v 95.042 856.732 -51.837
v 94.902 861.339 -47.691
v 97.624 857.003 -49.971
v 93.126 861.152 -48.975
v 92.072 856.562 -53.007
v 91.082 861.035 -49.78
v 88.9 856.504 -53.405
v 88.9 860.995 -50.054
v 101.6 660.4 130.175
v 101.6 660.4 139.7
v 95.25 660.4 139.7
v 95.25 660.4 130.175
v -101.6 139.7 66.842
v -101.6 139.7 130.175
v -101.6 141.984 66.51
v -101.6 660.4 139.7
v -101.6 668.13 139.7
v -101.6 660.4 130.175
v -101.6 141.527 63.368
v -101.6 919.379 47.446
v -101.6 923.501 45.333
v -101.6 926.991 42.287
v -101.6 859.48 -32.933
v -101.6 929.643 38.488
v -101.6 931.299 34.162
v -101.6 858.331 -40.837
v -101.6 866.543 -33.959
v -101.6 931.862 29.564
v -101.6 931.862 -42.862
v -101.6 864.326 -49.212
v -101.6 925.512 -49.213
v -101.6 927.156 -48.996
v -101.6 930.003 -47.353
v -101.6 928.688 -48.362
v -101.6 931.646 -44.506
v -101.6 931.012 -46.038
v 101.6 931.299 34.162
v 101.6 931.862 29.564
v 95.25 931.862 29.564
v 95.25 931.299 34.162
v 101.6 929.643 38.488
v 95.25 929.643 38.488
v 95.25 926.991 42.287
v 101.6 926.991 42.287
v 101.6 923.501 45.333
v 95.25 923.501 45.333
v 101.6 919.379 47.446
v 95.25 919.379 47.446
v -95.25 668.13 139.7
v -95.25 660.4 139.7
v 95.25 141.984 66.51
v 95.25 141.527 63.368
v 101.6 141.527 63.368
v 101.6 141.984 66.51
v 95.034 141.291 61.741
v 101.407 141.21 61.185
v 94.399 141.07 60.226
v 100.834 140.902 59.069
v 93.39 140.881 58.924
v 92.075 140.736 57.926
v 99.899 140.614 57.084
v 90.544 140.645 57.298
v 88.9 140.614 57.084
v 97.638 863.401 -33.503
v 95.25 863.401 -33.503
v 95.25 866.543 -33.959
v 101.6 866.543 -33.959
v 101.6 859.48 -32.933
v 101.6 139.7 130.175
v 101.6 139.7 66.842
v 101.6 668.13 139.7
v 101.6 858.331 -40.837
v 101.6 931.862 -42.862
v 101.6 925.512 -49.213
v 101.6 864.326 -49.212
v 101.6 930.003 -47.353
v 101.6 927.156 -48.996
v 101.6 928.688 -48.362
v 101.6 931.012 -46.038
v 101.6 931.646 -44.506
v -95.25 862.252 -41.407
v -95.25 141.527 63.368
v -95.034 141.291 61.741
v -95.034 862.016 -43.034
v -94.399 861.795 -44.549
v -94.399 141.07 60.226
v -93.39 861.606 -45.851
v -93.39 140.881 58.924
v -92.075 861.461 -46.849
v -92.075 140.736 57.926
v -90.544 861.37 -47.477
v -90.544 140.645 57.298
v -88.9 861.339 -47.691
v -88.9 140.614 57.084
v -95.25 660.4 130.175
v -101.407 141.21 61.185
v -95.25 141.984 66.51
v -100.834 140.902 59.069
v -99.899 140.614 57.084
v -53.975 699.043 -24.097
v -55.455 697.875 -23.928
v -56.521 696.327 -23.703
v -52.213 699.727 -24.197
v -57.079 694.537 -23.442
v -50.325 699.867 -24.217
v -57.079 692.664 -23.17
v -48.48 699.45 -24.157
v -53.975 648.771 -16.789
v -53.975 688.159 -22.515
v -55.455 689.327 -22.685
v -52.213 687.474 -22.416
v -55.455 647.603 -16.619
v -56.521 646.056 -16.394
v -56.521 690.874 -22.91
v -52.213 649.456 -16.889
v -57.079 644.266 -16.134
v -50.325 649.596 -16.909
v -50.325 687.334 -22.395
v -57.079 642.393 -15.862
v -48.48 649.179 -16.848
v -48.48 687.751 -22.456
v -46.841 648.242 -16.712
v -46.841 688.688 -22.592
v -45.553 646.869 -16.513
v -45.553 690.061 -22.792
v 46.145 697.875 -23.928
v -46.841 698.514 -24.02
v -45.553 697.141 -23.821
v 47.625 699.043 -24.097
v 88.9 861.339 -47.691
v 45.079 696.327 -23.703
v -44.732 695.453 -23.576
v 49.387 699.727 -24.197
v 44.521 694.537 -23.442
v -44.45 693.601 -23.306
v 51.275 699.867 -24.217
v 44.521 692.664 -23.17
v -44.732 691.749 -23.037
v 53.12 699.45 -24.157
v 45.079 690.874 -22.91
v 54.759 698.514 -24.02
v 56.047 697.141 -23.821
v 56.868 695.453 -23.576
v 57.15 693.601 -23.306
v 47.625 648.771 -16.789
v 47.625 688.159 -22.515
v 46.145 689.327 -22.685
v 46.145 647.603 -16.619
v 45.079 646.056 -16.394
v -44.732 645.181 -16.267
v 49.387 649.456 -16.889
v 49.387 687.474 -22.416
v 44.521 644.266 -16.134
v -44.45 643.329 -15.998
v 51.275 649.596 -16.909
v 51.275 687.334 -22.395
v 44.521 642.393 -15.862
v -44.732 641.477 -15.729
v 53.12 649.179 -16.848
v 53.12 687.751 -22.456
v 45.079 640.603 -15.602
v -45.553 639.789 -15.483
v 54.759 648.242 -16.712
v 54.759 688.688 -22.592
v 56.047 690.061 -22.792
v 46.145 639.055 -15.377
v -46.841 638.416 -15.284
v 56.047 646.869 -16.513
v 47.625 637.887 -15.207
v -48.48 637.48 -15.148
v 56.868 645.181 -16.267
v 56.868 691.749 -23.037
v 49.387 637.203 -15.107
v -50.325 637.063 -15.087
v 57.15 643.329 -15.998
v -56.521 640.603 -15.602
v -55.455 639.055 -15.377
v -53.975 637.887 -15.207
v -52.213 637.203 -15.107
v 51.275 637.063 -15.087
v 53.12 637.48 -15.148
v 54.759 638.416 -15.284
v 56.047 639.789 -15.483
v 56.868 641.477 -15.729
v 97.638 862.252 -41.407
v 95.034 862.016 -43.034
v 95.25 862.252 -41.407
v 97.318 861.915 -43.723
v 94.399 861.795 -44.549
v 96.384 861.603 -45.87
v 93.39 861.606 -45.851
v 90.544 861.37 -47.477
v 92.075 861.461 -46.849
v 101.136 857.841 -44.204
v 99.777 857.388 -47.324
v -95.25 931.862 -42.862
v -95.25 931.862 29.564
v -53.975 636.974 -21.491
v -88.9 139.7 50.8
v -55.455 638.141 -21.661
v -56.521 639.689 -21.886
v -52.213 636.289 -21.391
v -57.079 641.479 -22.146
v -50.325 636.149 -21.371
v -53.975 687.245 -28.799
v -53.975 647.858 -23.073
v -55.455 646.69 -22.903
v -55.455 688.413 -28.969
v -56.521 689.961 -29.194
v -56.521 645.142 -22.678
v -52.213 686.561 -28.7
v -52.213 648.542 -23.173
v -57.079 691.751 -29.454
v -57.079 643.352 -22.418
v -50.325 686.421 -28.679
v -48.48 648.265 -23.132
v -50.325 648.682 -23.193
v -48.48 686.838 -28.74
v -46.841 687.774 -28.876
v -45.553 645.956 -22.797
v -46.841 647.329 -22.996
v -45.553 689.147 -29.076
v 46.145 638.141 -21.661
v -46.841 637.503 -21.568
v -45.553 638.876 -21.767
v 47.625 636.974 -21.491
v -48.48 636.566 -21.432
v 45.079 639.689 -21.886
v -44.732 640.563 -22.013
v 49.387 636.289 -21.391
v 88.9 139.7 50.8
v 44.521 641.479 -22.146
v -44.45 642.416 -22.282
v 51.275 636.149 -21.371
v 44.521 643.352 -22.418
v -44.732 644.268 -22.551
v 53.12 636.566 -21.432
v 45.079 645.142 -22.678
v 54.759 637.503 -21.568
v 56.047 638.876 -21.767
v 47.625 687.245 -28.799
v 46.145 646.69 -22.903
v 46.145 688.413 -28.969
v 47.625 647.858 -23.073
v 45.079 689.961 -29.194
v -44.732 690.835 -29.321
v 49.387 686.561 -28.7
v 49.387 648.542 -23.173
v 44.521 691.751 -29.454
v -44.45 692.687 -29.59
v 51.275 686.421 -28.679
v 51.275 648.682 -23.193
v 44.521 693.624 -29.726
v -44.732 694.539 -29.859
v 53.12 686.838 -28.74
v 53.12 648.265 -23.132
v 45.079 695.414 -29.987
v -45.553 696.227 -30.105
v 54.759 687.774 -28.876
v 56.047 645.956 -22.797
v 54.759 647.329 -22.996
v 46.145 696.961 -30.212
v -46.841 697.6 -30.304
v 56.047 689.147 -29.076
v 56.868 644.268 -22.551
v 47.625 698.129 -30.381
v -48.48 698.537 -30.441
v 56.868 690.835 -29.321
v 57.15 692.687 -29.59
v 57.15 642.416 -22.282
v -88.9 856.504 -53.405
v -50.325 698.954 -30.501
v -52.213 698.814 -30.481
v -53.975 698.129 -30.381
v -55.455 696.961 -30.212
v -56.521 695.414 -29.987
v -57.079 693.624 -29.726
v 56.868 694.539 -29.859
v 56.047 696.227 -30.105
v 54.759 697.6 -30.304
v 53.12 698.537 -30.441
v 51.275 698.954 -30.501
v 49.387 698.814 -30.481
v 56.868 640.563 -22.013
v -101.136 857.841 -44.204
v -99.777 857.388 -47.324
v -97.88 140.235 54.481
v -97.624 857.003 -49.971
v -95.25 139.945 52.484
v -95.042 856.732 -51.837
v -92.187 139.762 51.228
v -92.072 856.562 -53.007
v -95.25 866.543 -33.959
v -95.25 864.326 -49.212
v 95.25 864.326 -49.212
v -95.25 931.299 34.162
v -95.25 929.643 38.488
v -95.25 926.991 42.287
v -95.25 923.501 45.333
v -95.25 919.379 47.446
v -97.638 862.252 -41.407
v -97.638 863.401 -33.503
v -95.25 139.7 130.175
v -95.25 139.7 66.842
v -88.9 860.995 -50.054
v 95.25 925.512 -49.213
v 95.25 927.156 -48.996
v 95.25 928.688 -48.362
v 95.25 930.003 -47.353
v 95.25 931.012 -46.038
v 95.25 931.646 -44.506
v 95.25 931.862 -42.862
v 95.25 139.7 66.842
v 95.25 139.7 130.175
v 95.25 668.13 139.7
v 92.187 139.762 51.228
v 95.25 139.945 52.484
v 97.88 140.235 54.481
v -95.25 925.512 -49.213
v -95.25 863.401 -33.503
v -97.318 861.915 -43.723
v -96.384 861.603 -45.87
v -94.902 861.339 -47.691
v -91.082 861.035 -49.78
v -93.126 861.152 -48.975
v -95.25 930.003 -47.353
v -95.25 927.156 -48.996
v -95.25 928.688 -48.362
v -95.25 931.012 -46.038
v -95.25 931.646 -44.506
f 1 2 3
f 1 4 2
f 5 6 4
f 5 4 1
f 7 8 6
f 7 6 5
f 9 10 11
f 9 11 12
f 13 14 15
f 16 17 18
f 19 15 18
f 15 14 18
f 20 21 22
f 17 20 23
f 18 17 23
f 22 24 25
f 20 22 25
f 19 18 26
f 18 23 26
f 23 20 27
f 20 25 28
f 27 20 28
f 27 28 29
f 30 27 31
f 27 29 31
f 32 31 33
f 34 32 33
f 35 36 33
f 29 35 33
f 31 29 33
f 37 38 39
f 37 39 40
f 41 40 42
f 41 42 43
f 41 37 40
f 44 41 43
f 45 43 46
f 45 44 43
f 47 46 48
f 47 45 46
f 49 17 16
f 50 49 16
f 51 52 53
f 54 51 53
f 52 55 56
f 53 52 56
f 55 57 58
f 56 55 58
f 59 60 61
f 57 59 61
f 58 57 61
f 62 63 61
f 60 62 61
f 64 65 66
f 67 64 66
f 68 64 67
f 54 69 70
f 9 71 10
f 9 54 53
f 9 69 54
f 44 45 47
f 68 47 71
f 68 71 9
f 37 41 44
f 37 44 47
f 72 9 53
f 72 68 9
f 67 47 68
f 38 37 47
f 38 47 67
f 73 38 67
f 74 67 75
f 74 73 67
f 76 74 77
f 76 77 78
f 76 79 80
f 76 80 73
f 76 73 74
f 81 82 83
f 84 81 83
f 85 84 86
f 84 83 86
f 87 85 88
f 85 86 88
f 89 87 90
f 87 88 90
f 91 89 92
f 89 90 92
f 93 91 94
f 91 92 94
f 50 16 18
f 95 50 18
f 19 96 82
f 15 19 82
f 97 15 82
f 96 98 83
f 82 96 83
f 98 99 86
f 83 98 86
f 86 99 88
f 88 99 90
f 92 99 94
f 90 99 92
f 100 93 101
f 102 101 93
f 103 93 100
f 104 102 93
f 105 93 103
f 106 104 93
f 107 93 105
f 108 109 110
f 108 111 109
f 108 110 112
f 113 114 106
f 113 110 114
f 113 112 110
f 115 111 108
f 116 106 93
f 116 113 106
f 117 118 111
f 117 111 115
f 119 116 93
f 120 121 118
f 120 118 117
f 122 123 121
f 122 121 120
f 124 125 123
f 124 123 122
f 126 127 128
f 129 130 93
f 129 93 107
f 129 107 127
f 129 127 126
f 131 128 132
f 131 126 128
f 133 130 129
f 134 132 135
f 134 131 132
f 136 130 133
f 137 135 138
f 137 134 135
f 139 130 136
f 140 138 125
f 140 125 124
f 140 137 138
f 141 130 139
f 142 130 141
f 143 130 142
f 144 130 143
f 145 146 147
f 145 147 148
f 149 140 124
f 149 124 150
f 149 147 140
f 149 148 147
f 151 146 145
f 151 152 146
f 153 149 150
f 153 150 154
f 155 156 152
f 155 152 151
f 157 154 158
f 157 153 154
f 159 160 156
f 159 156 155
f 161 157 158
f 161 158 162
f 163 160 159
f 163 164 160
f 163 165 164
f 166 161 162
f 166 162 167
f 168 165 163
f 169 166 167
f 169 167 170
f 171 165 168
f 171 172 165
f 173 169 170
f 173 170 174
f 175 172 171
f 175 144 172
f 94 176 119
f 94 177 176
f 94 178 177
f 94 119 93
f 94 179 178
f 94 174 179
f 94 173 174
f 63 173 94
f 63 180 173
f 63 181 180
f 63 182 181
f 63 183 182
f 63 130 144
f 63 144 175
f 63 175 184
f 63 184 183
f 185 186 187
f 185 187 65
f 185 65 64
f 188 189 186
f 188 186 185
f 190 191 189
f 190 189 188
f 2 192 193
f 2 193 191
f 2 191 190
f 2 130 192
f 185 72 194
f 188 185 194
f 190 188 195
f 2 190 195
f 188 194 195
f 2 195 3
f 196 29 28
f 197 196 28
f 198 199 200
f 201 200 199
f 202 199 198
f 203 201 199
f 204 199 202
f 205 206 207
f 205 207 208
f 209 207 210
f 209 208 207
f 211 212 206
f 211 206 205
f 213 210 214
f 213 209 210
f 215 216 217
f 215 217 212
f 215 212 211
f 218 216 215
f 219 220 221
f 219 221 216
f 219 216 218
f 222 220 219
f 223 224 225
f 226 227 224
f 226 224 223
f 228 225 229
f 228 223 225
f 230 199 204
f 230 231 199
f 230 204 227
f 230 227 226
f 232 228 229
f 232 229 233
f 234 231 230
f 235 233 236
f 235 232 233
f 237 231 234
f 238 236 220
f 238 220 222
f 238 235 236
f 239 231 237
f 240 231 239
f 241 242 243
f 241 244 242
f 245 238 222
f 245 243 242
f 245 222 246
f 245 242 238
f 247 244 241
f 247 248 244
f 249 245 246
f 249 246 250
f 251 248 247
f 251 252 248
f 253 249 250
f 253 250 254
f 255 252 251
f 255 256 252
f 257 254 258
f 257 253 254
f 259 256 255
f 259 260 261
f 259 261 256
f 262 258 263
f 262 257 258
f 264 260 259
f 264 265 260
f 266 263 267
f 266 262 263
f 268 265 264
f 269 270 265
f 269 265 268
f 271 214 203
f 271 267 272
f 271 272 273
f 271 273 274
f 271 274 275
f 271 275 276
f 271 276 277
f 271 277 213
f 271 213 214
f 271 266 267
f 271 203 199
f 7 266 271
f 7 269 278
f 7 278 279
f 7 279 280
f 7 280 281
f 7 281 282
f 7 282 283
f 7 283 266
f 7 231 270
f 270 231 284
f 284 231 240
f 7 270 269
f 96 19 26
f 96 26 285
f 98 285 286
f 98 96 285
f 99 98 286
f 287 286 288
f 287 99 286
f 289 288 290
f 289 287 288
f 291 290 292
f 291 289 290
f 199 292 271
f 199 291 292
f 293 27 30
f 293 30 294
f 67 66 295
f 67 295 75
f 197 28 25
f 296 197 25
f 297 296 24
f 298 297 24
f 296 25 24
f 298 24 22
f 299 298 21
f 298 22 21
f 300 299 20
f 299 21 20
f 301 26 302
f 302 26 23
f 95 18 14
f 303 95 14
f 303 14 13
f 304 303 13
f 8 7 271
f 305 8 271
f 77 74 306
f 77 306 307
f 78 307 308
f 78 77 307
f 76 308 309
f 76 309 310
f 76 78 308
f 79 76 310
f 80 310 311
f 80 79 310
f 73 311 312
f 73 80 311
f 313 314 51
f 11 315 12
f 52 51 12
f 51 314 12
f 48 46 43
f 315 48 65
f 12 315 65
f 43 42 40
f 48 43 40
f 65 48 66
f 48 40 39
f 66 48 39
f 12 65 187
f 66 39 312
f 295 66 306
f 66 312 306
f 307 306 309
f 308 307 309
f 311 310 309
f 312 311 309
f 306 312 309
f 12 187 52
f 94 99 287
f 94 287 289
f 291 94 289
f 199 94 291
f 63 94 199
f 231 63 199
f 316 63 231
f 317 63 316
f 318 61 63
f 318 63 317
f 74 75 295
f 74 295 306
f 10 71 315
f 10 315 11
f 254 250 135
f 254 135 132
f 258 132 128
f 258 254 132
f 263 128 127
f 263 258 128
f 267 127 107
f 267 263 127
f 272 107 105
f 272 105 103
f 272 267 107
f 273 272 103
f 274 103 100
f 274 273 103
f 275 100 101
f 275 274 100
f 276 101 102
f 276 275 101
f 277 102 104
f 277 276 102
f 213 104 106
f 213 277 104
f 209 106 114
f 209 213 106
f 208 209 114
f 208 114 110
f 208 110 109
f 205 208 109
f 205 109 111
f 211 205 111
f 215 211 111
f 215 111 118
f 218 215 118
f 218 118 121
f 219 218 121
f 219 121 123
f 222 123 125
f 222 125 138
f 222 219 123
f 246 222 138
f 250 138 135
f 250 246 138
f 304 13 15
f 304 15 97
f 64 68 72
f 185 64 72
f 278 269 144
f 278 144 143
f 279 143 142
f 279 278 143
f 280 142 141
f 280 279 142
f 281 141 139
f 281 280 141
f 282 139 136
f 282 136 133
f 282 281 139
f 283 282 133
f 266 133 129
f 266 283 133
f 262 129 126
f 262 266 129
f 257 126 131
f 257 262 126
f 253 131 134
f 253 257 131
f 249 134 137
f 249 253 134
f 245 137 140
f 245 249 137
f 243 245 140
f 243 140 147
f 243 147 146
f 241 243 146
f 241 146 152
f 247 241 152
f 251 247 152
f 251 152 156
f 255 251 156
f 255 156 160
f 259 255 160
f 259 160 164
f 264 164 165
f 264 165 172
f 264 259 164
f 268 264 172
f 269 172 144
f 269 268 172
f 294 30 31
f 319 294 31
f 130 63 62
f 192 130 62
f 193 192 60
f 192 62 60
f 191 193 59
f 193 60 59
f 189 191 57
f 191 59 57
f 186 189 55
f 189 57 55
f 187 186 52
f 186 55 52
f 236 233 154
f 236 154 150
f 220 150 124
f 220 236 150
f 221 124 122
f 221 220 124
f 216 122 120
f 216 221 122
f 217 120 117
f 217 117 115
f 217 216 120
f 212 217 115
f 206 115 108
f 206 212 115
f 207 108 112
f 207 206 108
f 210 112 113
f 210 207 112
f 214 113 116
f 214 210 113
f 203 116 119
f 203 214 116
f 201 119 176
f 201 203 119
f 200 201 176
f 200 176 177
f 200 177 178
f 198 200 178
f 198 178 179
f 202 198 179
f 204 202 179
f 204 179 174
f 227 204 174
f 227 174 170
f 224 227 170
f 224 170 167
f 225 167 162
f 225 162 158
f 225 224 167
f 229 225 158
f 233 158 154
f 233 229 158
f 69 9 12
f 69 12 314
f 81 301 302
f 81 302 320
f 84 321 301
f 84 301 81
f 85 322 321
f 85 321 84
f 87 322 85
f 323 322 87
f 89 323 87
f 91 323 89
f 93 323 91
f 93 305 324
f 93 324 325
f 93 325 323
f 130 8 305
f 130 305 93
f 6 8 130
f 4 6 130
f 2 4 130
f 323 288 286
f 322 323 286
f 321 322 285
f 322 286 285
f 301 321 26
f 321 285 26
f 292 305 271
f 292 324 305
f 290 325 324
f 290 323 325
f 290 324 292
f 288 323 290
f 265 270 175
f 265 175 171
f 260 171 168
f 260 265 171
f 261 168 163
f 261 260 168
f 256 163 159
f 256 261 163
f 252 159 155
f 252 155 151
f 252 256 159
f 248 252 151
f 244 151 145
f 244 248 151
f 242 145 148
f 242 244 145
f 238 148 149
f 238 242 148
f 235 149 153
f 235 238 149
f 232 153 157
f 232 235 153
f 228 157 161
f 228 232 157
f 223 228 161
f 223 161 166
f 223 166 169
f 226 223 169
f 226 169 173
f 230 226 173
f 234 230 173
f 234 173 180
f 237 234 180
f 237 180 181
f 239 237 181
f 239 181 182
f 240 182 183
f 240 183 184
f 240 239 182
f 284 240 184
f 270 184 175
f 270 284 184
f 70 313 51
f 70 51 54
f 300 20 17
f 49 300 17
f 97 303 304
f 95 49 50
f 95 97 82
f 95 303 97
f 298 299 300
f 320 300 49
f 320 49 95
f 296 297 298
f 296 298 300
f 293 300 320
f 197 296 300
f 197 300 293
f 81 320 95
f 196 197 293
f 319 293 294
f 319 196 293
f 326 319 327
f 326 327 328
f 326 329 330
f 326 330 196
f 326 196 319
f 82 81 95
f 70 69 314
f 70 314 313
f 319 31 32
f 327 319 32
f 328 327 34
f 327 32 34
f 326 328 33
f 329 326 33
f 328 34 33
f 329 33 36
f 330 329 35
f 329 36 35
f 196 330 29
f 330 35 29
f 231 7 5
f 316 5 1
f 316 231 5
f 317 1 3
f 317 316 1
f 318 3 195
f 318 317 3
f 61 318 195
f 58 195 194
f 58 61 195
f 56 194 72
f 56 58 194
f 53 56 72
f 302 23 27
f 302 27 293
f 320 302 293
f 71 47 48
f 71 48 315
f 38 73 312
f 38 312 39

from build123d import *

# Parameters (mm, degrees)
BOSS_EXTRUDE1_DEPTH    = 101.6
BOSS_EXTRUDE2_DEPTH    = 6.35
CUT_EXTRUDE1_START     = 70.369117279
CUT_EXTRUDE1_OUTLINE_R = 6.35
CUT_EXTRUDE1_DEPTH     = 6.35
FLATTEN_BENDS1_START   = 128.994638868
FLATTEN_BENDS1_DEPTH   = 733.419948548
FLATTEN_BENDS1_START_2 = 859.239587416
FLATTEN_BENDS1_2_DEPTH = 3.175
FLATTEN_BENDS1_START_3 = 128.630782005
FLATTEN_BENDS1_3_DEPTH = 2.307819383
FLATTEN_BENDS1_START_4 = 130.938601388
FLATTEN_BENDS1_4_DEPTH = 728.300986028
CHAMFER1_SIZE          = 3.9624


# Read off the part's stored shape, not the designer's step: Cut-Extrude1, Flatten-Bends1
with BuildPart() as part:
    # Sketch11 → Boss-Extrude1 (new, symmetric)
    with BuildSketch(Plane(origin=(0, 0, 0), x_dir=(0, 0, -1), z_dir=(1, 0, 0))):
        Polygon((-57.083945563, 140.613525126), (-50.8, 139.7), (53.975, 860.425), (47.691054437, 861.338525126), align=None)
    extrude(amount=BOSS_EXTRUDE1_DEPTH, both=True)

    # Sketch8 → Boss-Extrude2 (add)
    with BuildSketch(Plane(origin=(101.6, 0, 0), x_dir=(0, 0, -1), z_dir=(1, 0, 0))):
        with BuildLine():
            Line((-130.175, 139.7), (-57.216748776, 139.7))
            Line((-57.216748776, 139.7), (-57.083945563, 140.613525126))
            Line((-57.083945563, 140.613525126), (-50.8, 139.7))
            Line((-50.8, 139.7), (53.975, 860.425))
            Line((53.975, 860.425), (49.2125, 861.117345815))
            Line((49.2125, 861.117345815), (49.2125, 925.5125))
            ThreePointArc((49.2125, 925.5125), (47.352628061, 930.002628061), (42.8625, 931.8625))
            Line((42.8625, 931.8625), (-29.563705158, 931.8625))
            ThreePointArc((-29.563705158, 931.8625), (-40.468229819, 928.432802235), (-47.446326779, 919.378651382))
            Line((-47.446326779, 919.378651382), (-139.7, 668.12987028))
            Line((-139.7, 668.12987028), (-139.7, 660.4))
            Line((-139.7, 660.4), (-130.175, 660.4))
            Line((-130.175, 660.4), (-130.175, 139.7))
        make_face()
    boss_extrude2 = extrude(amount=-BOSS_EXTRUDE2_DEPTH)

    # Mirror1: Boss-Extrude2 across plane
    add(boss_extrude2.mirror(Plane(origin=(0, 0, 0), x_dir=(0, 0, 1), z_dir=(1, 0, 0))))

    # Cut-Extrude1 outline → Cut-Extrude1 (cut)
    with BuildSketch(Plane(origin=(0, 0, 0), x_dir=(1, 0, 0), z_dir=(0, 0.143862224560971, 0.989597726525465)).offset(CUT_EXTRUDE1_START)):
        with Locations((50.8, 638.938601388)):
            Circle(CUT_EXTRUDE1_OUTLINE_R)
        with Locations((50.8, 689.738601388)):
            Circle(CUT_EXTRUDE1_OUTLINE_R)
        with Locations((-50.8, 638.938601388)):
            Circle(CUT_EXTRUDE1_OUTLINE_R)
        with Locations((-50.8, 689.738601388)):
            Circle(CUT_EXTRUDE1_OUTLINE_R)
    extrude(amount=CUT_EXTRUDE1_DEPTH, mode=Mode.SUBTRACT)

    # Flatten-Bends1 outline → Flatten-Bends1 (cut)
    with BuildSketch(Plane(origin=(0, 0, 0), x_dir=(1, 0, 0), z_dir=(0, 0.989597726525465, -0.143862224560971)).offset(FLATTEN_BENDS1_START)):
        with BuildLine():
            ThreePointArc((-101.6, -83.069117279), (-97.880256121, -74.088861158), (-88.9, -70.369117279))
            Line((-88.9, -70.369117279), (-101.6, -70.369117279))
            Line((-101.6, -70.369117279), (-101.6, -83.069117279))
        make_face()
        with BuildLine():
            Line((101.6, -70.369117279), (88.9, -70.369117279))
            ThreePointArc((88.9, -70.369117279), (97.880256121, -74.088861158), (101.6, -83.069117279))
            Line((101.6, -83.069117279), (101.6, -70.369117279))
        make_face()
    extrude(amount=FLATTEN_BENDS1_DEPTH, mode=Mode.SUBTRACT)

    # Flatten-Bends1 2 outline → Flatten-Bends1 2 (cut)
    with BuildSketch(Plane(origin=(0, 0, 0), x_dir=(1, 0, 0), z_dir=(0, 0.989597726525465, -0.143862224560971)).offset(FLATTEN_BENDS1_START_2)):
        with BuildLine():
            Line((-101.6, -83.069117279), (-101.6, -91.05667886))
            Line((-101.6, -91.05667886), (-95.25, -91.05667886))
            Line((-95.25, -91.05667886), (-95.25, -76.719117279))
            Line((-95.25, -76.719117279), (95.25, -76.719117279))
            Line((95.25, -76.719117279), (95.25, -91.05667886))
            Line((95.25, -91.05667886), (101.6, -91.05667886))
            Line((101.6, -91.05667886), (101.6, -83.069117279))
            ThreePointArc((101.6, -83.069117279), (97.880256121, -74.088861158), (88.9, -70.369117279))
            Line((88.9, -70.369117279), (-88.9, -70.369117279))
            ThreePointArc((-88.9, -70.369117279), (-97.880256121, -74.088861158), (-101.6, -83.069117279))
        make_face()
    extrude(amount=FLATTEN_BENDS1_2_DEPTH, mode=Mode.SUBTRACT)

    # Flatten-Bends1 3 outline → Flatten-Bends1 3 (cut)
    with BuildSketch(Plane(origin=(0, 0, 0), x_dir=(1, 0, 0), z_dir=(0, 0.989597726525465, -0.143862224560971)).offset(FLATTEN_BENDS1_START_3)):
        with BuildLine():
            Line((-101.6, -83.069117279), (-101.6, -86.244117279))
            Line((-101.6, -86.244117279), (-95.25, -86.244117279))
            Line((-95.25, -86.244117279), (-95.25, -76.719117279))
            Line((-95.25, -76.719117279), (-99.898522628, -76.719117279))
            ThreePointArc((-99.898522628, -76.719117279), (-101.167257994, -79.782115406), (-101.6, -83.069117279))
        make_face()
        with BuildLine():
            Line((95.25, -76.719117279), (95.25, -86.244117279))
            Line((95.25, -86.244117279), (101.6, -86.244117279))
            Line((101.6, -86.244117279), (101.6, -83.069117279))
            ThreePointArc((101.6, -83.069117279), (101.167257994, -79.782115406), (99.898522628, -76.719117279))
            Line((99.898522628, -76.719117279), (95.25, -76.719117279))
        make_face()
    extrude(amount=FLATTEN_BENDS1_3_DEPTH, mode=Mode.SUBTRACT)

    # Flatten-Bends1 4 outline → Flatten-Bends1 4 (add)
    with BuildSketch(Plane(origin=(0, 0, 0), x_dir=(1, 0, 0), z_dir=(0, 0.989597726525465, -0.143862224560971)).offset(FLATTEN_BENDS1_START_4)):
        with BuildLine():
            Line((-95.25, -76.719117279), (-95.25, -83.069117279))
            ThreePointArc((-95.25, -83.069117279), (-93.390128061, -78.578989218), (-88.9, -76.719117279))
            Line((-88.9, -76.719117279), (-95.25, -76.719117279))
        make_face()
        with BuildLine():
            Line((95.25, -76.719117279), (88.9, -76.719117279))
            ThreePointArc((88.9, -76.719117279), (93.390128061, -78.578989218), (95.25, -83.069117279))
            Line((95.25, -83.069117279), (95.25, -76.719117279))
        make_face()
    extrude(amount=FLATTEN_BENDS1_4_DEPTH)

    # Chamfer1
    chamfer1_edges = [part.edges().sort_by_distance(p)[0] for p in [
        (101.6, 862.826604441, -37.454872482),
        (0, 860.425, -53.975),
        (97.880256121, 860.960130629, -50.293949914),
        (-97.880256121, 860.960130629, -50.293949914),
        (-101.6, 862.826604441, -37.454872482),
    ]]
    chamfer(chamfer1_edges, length=CHAMFER1_SIZE)


solid = part.part
